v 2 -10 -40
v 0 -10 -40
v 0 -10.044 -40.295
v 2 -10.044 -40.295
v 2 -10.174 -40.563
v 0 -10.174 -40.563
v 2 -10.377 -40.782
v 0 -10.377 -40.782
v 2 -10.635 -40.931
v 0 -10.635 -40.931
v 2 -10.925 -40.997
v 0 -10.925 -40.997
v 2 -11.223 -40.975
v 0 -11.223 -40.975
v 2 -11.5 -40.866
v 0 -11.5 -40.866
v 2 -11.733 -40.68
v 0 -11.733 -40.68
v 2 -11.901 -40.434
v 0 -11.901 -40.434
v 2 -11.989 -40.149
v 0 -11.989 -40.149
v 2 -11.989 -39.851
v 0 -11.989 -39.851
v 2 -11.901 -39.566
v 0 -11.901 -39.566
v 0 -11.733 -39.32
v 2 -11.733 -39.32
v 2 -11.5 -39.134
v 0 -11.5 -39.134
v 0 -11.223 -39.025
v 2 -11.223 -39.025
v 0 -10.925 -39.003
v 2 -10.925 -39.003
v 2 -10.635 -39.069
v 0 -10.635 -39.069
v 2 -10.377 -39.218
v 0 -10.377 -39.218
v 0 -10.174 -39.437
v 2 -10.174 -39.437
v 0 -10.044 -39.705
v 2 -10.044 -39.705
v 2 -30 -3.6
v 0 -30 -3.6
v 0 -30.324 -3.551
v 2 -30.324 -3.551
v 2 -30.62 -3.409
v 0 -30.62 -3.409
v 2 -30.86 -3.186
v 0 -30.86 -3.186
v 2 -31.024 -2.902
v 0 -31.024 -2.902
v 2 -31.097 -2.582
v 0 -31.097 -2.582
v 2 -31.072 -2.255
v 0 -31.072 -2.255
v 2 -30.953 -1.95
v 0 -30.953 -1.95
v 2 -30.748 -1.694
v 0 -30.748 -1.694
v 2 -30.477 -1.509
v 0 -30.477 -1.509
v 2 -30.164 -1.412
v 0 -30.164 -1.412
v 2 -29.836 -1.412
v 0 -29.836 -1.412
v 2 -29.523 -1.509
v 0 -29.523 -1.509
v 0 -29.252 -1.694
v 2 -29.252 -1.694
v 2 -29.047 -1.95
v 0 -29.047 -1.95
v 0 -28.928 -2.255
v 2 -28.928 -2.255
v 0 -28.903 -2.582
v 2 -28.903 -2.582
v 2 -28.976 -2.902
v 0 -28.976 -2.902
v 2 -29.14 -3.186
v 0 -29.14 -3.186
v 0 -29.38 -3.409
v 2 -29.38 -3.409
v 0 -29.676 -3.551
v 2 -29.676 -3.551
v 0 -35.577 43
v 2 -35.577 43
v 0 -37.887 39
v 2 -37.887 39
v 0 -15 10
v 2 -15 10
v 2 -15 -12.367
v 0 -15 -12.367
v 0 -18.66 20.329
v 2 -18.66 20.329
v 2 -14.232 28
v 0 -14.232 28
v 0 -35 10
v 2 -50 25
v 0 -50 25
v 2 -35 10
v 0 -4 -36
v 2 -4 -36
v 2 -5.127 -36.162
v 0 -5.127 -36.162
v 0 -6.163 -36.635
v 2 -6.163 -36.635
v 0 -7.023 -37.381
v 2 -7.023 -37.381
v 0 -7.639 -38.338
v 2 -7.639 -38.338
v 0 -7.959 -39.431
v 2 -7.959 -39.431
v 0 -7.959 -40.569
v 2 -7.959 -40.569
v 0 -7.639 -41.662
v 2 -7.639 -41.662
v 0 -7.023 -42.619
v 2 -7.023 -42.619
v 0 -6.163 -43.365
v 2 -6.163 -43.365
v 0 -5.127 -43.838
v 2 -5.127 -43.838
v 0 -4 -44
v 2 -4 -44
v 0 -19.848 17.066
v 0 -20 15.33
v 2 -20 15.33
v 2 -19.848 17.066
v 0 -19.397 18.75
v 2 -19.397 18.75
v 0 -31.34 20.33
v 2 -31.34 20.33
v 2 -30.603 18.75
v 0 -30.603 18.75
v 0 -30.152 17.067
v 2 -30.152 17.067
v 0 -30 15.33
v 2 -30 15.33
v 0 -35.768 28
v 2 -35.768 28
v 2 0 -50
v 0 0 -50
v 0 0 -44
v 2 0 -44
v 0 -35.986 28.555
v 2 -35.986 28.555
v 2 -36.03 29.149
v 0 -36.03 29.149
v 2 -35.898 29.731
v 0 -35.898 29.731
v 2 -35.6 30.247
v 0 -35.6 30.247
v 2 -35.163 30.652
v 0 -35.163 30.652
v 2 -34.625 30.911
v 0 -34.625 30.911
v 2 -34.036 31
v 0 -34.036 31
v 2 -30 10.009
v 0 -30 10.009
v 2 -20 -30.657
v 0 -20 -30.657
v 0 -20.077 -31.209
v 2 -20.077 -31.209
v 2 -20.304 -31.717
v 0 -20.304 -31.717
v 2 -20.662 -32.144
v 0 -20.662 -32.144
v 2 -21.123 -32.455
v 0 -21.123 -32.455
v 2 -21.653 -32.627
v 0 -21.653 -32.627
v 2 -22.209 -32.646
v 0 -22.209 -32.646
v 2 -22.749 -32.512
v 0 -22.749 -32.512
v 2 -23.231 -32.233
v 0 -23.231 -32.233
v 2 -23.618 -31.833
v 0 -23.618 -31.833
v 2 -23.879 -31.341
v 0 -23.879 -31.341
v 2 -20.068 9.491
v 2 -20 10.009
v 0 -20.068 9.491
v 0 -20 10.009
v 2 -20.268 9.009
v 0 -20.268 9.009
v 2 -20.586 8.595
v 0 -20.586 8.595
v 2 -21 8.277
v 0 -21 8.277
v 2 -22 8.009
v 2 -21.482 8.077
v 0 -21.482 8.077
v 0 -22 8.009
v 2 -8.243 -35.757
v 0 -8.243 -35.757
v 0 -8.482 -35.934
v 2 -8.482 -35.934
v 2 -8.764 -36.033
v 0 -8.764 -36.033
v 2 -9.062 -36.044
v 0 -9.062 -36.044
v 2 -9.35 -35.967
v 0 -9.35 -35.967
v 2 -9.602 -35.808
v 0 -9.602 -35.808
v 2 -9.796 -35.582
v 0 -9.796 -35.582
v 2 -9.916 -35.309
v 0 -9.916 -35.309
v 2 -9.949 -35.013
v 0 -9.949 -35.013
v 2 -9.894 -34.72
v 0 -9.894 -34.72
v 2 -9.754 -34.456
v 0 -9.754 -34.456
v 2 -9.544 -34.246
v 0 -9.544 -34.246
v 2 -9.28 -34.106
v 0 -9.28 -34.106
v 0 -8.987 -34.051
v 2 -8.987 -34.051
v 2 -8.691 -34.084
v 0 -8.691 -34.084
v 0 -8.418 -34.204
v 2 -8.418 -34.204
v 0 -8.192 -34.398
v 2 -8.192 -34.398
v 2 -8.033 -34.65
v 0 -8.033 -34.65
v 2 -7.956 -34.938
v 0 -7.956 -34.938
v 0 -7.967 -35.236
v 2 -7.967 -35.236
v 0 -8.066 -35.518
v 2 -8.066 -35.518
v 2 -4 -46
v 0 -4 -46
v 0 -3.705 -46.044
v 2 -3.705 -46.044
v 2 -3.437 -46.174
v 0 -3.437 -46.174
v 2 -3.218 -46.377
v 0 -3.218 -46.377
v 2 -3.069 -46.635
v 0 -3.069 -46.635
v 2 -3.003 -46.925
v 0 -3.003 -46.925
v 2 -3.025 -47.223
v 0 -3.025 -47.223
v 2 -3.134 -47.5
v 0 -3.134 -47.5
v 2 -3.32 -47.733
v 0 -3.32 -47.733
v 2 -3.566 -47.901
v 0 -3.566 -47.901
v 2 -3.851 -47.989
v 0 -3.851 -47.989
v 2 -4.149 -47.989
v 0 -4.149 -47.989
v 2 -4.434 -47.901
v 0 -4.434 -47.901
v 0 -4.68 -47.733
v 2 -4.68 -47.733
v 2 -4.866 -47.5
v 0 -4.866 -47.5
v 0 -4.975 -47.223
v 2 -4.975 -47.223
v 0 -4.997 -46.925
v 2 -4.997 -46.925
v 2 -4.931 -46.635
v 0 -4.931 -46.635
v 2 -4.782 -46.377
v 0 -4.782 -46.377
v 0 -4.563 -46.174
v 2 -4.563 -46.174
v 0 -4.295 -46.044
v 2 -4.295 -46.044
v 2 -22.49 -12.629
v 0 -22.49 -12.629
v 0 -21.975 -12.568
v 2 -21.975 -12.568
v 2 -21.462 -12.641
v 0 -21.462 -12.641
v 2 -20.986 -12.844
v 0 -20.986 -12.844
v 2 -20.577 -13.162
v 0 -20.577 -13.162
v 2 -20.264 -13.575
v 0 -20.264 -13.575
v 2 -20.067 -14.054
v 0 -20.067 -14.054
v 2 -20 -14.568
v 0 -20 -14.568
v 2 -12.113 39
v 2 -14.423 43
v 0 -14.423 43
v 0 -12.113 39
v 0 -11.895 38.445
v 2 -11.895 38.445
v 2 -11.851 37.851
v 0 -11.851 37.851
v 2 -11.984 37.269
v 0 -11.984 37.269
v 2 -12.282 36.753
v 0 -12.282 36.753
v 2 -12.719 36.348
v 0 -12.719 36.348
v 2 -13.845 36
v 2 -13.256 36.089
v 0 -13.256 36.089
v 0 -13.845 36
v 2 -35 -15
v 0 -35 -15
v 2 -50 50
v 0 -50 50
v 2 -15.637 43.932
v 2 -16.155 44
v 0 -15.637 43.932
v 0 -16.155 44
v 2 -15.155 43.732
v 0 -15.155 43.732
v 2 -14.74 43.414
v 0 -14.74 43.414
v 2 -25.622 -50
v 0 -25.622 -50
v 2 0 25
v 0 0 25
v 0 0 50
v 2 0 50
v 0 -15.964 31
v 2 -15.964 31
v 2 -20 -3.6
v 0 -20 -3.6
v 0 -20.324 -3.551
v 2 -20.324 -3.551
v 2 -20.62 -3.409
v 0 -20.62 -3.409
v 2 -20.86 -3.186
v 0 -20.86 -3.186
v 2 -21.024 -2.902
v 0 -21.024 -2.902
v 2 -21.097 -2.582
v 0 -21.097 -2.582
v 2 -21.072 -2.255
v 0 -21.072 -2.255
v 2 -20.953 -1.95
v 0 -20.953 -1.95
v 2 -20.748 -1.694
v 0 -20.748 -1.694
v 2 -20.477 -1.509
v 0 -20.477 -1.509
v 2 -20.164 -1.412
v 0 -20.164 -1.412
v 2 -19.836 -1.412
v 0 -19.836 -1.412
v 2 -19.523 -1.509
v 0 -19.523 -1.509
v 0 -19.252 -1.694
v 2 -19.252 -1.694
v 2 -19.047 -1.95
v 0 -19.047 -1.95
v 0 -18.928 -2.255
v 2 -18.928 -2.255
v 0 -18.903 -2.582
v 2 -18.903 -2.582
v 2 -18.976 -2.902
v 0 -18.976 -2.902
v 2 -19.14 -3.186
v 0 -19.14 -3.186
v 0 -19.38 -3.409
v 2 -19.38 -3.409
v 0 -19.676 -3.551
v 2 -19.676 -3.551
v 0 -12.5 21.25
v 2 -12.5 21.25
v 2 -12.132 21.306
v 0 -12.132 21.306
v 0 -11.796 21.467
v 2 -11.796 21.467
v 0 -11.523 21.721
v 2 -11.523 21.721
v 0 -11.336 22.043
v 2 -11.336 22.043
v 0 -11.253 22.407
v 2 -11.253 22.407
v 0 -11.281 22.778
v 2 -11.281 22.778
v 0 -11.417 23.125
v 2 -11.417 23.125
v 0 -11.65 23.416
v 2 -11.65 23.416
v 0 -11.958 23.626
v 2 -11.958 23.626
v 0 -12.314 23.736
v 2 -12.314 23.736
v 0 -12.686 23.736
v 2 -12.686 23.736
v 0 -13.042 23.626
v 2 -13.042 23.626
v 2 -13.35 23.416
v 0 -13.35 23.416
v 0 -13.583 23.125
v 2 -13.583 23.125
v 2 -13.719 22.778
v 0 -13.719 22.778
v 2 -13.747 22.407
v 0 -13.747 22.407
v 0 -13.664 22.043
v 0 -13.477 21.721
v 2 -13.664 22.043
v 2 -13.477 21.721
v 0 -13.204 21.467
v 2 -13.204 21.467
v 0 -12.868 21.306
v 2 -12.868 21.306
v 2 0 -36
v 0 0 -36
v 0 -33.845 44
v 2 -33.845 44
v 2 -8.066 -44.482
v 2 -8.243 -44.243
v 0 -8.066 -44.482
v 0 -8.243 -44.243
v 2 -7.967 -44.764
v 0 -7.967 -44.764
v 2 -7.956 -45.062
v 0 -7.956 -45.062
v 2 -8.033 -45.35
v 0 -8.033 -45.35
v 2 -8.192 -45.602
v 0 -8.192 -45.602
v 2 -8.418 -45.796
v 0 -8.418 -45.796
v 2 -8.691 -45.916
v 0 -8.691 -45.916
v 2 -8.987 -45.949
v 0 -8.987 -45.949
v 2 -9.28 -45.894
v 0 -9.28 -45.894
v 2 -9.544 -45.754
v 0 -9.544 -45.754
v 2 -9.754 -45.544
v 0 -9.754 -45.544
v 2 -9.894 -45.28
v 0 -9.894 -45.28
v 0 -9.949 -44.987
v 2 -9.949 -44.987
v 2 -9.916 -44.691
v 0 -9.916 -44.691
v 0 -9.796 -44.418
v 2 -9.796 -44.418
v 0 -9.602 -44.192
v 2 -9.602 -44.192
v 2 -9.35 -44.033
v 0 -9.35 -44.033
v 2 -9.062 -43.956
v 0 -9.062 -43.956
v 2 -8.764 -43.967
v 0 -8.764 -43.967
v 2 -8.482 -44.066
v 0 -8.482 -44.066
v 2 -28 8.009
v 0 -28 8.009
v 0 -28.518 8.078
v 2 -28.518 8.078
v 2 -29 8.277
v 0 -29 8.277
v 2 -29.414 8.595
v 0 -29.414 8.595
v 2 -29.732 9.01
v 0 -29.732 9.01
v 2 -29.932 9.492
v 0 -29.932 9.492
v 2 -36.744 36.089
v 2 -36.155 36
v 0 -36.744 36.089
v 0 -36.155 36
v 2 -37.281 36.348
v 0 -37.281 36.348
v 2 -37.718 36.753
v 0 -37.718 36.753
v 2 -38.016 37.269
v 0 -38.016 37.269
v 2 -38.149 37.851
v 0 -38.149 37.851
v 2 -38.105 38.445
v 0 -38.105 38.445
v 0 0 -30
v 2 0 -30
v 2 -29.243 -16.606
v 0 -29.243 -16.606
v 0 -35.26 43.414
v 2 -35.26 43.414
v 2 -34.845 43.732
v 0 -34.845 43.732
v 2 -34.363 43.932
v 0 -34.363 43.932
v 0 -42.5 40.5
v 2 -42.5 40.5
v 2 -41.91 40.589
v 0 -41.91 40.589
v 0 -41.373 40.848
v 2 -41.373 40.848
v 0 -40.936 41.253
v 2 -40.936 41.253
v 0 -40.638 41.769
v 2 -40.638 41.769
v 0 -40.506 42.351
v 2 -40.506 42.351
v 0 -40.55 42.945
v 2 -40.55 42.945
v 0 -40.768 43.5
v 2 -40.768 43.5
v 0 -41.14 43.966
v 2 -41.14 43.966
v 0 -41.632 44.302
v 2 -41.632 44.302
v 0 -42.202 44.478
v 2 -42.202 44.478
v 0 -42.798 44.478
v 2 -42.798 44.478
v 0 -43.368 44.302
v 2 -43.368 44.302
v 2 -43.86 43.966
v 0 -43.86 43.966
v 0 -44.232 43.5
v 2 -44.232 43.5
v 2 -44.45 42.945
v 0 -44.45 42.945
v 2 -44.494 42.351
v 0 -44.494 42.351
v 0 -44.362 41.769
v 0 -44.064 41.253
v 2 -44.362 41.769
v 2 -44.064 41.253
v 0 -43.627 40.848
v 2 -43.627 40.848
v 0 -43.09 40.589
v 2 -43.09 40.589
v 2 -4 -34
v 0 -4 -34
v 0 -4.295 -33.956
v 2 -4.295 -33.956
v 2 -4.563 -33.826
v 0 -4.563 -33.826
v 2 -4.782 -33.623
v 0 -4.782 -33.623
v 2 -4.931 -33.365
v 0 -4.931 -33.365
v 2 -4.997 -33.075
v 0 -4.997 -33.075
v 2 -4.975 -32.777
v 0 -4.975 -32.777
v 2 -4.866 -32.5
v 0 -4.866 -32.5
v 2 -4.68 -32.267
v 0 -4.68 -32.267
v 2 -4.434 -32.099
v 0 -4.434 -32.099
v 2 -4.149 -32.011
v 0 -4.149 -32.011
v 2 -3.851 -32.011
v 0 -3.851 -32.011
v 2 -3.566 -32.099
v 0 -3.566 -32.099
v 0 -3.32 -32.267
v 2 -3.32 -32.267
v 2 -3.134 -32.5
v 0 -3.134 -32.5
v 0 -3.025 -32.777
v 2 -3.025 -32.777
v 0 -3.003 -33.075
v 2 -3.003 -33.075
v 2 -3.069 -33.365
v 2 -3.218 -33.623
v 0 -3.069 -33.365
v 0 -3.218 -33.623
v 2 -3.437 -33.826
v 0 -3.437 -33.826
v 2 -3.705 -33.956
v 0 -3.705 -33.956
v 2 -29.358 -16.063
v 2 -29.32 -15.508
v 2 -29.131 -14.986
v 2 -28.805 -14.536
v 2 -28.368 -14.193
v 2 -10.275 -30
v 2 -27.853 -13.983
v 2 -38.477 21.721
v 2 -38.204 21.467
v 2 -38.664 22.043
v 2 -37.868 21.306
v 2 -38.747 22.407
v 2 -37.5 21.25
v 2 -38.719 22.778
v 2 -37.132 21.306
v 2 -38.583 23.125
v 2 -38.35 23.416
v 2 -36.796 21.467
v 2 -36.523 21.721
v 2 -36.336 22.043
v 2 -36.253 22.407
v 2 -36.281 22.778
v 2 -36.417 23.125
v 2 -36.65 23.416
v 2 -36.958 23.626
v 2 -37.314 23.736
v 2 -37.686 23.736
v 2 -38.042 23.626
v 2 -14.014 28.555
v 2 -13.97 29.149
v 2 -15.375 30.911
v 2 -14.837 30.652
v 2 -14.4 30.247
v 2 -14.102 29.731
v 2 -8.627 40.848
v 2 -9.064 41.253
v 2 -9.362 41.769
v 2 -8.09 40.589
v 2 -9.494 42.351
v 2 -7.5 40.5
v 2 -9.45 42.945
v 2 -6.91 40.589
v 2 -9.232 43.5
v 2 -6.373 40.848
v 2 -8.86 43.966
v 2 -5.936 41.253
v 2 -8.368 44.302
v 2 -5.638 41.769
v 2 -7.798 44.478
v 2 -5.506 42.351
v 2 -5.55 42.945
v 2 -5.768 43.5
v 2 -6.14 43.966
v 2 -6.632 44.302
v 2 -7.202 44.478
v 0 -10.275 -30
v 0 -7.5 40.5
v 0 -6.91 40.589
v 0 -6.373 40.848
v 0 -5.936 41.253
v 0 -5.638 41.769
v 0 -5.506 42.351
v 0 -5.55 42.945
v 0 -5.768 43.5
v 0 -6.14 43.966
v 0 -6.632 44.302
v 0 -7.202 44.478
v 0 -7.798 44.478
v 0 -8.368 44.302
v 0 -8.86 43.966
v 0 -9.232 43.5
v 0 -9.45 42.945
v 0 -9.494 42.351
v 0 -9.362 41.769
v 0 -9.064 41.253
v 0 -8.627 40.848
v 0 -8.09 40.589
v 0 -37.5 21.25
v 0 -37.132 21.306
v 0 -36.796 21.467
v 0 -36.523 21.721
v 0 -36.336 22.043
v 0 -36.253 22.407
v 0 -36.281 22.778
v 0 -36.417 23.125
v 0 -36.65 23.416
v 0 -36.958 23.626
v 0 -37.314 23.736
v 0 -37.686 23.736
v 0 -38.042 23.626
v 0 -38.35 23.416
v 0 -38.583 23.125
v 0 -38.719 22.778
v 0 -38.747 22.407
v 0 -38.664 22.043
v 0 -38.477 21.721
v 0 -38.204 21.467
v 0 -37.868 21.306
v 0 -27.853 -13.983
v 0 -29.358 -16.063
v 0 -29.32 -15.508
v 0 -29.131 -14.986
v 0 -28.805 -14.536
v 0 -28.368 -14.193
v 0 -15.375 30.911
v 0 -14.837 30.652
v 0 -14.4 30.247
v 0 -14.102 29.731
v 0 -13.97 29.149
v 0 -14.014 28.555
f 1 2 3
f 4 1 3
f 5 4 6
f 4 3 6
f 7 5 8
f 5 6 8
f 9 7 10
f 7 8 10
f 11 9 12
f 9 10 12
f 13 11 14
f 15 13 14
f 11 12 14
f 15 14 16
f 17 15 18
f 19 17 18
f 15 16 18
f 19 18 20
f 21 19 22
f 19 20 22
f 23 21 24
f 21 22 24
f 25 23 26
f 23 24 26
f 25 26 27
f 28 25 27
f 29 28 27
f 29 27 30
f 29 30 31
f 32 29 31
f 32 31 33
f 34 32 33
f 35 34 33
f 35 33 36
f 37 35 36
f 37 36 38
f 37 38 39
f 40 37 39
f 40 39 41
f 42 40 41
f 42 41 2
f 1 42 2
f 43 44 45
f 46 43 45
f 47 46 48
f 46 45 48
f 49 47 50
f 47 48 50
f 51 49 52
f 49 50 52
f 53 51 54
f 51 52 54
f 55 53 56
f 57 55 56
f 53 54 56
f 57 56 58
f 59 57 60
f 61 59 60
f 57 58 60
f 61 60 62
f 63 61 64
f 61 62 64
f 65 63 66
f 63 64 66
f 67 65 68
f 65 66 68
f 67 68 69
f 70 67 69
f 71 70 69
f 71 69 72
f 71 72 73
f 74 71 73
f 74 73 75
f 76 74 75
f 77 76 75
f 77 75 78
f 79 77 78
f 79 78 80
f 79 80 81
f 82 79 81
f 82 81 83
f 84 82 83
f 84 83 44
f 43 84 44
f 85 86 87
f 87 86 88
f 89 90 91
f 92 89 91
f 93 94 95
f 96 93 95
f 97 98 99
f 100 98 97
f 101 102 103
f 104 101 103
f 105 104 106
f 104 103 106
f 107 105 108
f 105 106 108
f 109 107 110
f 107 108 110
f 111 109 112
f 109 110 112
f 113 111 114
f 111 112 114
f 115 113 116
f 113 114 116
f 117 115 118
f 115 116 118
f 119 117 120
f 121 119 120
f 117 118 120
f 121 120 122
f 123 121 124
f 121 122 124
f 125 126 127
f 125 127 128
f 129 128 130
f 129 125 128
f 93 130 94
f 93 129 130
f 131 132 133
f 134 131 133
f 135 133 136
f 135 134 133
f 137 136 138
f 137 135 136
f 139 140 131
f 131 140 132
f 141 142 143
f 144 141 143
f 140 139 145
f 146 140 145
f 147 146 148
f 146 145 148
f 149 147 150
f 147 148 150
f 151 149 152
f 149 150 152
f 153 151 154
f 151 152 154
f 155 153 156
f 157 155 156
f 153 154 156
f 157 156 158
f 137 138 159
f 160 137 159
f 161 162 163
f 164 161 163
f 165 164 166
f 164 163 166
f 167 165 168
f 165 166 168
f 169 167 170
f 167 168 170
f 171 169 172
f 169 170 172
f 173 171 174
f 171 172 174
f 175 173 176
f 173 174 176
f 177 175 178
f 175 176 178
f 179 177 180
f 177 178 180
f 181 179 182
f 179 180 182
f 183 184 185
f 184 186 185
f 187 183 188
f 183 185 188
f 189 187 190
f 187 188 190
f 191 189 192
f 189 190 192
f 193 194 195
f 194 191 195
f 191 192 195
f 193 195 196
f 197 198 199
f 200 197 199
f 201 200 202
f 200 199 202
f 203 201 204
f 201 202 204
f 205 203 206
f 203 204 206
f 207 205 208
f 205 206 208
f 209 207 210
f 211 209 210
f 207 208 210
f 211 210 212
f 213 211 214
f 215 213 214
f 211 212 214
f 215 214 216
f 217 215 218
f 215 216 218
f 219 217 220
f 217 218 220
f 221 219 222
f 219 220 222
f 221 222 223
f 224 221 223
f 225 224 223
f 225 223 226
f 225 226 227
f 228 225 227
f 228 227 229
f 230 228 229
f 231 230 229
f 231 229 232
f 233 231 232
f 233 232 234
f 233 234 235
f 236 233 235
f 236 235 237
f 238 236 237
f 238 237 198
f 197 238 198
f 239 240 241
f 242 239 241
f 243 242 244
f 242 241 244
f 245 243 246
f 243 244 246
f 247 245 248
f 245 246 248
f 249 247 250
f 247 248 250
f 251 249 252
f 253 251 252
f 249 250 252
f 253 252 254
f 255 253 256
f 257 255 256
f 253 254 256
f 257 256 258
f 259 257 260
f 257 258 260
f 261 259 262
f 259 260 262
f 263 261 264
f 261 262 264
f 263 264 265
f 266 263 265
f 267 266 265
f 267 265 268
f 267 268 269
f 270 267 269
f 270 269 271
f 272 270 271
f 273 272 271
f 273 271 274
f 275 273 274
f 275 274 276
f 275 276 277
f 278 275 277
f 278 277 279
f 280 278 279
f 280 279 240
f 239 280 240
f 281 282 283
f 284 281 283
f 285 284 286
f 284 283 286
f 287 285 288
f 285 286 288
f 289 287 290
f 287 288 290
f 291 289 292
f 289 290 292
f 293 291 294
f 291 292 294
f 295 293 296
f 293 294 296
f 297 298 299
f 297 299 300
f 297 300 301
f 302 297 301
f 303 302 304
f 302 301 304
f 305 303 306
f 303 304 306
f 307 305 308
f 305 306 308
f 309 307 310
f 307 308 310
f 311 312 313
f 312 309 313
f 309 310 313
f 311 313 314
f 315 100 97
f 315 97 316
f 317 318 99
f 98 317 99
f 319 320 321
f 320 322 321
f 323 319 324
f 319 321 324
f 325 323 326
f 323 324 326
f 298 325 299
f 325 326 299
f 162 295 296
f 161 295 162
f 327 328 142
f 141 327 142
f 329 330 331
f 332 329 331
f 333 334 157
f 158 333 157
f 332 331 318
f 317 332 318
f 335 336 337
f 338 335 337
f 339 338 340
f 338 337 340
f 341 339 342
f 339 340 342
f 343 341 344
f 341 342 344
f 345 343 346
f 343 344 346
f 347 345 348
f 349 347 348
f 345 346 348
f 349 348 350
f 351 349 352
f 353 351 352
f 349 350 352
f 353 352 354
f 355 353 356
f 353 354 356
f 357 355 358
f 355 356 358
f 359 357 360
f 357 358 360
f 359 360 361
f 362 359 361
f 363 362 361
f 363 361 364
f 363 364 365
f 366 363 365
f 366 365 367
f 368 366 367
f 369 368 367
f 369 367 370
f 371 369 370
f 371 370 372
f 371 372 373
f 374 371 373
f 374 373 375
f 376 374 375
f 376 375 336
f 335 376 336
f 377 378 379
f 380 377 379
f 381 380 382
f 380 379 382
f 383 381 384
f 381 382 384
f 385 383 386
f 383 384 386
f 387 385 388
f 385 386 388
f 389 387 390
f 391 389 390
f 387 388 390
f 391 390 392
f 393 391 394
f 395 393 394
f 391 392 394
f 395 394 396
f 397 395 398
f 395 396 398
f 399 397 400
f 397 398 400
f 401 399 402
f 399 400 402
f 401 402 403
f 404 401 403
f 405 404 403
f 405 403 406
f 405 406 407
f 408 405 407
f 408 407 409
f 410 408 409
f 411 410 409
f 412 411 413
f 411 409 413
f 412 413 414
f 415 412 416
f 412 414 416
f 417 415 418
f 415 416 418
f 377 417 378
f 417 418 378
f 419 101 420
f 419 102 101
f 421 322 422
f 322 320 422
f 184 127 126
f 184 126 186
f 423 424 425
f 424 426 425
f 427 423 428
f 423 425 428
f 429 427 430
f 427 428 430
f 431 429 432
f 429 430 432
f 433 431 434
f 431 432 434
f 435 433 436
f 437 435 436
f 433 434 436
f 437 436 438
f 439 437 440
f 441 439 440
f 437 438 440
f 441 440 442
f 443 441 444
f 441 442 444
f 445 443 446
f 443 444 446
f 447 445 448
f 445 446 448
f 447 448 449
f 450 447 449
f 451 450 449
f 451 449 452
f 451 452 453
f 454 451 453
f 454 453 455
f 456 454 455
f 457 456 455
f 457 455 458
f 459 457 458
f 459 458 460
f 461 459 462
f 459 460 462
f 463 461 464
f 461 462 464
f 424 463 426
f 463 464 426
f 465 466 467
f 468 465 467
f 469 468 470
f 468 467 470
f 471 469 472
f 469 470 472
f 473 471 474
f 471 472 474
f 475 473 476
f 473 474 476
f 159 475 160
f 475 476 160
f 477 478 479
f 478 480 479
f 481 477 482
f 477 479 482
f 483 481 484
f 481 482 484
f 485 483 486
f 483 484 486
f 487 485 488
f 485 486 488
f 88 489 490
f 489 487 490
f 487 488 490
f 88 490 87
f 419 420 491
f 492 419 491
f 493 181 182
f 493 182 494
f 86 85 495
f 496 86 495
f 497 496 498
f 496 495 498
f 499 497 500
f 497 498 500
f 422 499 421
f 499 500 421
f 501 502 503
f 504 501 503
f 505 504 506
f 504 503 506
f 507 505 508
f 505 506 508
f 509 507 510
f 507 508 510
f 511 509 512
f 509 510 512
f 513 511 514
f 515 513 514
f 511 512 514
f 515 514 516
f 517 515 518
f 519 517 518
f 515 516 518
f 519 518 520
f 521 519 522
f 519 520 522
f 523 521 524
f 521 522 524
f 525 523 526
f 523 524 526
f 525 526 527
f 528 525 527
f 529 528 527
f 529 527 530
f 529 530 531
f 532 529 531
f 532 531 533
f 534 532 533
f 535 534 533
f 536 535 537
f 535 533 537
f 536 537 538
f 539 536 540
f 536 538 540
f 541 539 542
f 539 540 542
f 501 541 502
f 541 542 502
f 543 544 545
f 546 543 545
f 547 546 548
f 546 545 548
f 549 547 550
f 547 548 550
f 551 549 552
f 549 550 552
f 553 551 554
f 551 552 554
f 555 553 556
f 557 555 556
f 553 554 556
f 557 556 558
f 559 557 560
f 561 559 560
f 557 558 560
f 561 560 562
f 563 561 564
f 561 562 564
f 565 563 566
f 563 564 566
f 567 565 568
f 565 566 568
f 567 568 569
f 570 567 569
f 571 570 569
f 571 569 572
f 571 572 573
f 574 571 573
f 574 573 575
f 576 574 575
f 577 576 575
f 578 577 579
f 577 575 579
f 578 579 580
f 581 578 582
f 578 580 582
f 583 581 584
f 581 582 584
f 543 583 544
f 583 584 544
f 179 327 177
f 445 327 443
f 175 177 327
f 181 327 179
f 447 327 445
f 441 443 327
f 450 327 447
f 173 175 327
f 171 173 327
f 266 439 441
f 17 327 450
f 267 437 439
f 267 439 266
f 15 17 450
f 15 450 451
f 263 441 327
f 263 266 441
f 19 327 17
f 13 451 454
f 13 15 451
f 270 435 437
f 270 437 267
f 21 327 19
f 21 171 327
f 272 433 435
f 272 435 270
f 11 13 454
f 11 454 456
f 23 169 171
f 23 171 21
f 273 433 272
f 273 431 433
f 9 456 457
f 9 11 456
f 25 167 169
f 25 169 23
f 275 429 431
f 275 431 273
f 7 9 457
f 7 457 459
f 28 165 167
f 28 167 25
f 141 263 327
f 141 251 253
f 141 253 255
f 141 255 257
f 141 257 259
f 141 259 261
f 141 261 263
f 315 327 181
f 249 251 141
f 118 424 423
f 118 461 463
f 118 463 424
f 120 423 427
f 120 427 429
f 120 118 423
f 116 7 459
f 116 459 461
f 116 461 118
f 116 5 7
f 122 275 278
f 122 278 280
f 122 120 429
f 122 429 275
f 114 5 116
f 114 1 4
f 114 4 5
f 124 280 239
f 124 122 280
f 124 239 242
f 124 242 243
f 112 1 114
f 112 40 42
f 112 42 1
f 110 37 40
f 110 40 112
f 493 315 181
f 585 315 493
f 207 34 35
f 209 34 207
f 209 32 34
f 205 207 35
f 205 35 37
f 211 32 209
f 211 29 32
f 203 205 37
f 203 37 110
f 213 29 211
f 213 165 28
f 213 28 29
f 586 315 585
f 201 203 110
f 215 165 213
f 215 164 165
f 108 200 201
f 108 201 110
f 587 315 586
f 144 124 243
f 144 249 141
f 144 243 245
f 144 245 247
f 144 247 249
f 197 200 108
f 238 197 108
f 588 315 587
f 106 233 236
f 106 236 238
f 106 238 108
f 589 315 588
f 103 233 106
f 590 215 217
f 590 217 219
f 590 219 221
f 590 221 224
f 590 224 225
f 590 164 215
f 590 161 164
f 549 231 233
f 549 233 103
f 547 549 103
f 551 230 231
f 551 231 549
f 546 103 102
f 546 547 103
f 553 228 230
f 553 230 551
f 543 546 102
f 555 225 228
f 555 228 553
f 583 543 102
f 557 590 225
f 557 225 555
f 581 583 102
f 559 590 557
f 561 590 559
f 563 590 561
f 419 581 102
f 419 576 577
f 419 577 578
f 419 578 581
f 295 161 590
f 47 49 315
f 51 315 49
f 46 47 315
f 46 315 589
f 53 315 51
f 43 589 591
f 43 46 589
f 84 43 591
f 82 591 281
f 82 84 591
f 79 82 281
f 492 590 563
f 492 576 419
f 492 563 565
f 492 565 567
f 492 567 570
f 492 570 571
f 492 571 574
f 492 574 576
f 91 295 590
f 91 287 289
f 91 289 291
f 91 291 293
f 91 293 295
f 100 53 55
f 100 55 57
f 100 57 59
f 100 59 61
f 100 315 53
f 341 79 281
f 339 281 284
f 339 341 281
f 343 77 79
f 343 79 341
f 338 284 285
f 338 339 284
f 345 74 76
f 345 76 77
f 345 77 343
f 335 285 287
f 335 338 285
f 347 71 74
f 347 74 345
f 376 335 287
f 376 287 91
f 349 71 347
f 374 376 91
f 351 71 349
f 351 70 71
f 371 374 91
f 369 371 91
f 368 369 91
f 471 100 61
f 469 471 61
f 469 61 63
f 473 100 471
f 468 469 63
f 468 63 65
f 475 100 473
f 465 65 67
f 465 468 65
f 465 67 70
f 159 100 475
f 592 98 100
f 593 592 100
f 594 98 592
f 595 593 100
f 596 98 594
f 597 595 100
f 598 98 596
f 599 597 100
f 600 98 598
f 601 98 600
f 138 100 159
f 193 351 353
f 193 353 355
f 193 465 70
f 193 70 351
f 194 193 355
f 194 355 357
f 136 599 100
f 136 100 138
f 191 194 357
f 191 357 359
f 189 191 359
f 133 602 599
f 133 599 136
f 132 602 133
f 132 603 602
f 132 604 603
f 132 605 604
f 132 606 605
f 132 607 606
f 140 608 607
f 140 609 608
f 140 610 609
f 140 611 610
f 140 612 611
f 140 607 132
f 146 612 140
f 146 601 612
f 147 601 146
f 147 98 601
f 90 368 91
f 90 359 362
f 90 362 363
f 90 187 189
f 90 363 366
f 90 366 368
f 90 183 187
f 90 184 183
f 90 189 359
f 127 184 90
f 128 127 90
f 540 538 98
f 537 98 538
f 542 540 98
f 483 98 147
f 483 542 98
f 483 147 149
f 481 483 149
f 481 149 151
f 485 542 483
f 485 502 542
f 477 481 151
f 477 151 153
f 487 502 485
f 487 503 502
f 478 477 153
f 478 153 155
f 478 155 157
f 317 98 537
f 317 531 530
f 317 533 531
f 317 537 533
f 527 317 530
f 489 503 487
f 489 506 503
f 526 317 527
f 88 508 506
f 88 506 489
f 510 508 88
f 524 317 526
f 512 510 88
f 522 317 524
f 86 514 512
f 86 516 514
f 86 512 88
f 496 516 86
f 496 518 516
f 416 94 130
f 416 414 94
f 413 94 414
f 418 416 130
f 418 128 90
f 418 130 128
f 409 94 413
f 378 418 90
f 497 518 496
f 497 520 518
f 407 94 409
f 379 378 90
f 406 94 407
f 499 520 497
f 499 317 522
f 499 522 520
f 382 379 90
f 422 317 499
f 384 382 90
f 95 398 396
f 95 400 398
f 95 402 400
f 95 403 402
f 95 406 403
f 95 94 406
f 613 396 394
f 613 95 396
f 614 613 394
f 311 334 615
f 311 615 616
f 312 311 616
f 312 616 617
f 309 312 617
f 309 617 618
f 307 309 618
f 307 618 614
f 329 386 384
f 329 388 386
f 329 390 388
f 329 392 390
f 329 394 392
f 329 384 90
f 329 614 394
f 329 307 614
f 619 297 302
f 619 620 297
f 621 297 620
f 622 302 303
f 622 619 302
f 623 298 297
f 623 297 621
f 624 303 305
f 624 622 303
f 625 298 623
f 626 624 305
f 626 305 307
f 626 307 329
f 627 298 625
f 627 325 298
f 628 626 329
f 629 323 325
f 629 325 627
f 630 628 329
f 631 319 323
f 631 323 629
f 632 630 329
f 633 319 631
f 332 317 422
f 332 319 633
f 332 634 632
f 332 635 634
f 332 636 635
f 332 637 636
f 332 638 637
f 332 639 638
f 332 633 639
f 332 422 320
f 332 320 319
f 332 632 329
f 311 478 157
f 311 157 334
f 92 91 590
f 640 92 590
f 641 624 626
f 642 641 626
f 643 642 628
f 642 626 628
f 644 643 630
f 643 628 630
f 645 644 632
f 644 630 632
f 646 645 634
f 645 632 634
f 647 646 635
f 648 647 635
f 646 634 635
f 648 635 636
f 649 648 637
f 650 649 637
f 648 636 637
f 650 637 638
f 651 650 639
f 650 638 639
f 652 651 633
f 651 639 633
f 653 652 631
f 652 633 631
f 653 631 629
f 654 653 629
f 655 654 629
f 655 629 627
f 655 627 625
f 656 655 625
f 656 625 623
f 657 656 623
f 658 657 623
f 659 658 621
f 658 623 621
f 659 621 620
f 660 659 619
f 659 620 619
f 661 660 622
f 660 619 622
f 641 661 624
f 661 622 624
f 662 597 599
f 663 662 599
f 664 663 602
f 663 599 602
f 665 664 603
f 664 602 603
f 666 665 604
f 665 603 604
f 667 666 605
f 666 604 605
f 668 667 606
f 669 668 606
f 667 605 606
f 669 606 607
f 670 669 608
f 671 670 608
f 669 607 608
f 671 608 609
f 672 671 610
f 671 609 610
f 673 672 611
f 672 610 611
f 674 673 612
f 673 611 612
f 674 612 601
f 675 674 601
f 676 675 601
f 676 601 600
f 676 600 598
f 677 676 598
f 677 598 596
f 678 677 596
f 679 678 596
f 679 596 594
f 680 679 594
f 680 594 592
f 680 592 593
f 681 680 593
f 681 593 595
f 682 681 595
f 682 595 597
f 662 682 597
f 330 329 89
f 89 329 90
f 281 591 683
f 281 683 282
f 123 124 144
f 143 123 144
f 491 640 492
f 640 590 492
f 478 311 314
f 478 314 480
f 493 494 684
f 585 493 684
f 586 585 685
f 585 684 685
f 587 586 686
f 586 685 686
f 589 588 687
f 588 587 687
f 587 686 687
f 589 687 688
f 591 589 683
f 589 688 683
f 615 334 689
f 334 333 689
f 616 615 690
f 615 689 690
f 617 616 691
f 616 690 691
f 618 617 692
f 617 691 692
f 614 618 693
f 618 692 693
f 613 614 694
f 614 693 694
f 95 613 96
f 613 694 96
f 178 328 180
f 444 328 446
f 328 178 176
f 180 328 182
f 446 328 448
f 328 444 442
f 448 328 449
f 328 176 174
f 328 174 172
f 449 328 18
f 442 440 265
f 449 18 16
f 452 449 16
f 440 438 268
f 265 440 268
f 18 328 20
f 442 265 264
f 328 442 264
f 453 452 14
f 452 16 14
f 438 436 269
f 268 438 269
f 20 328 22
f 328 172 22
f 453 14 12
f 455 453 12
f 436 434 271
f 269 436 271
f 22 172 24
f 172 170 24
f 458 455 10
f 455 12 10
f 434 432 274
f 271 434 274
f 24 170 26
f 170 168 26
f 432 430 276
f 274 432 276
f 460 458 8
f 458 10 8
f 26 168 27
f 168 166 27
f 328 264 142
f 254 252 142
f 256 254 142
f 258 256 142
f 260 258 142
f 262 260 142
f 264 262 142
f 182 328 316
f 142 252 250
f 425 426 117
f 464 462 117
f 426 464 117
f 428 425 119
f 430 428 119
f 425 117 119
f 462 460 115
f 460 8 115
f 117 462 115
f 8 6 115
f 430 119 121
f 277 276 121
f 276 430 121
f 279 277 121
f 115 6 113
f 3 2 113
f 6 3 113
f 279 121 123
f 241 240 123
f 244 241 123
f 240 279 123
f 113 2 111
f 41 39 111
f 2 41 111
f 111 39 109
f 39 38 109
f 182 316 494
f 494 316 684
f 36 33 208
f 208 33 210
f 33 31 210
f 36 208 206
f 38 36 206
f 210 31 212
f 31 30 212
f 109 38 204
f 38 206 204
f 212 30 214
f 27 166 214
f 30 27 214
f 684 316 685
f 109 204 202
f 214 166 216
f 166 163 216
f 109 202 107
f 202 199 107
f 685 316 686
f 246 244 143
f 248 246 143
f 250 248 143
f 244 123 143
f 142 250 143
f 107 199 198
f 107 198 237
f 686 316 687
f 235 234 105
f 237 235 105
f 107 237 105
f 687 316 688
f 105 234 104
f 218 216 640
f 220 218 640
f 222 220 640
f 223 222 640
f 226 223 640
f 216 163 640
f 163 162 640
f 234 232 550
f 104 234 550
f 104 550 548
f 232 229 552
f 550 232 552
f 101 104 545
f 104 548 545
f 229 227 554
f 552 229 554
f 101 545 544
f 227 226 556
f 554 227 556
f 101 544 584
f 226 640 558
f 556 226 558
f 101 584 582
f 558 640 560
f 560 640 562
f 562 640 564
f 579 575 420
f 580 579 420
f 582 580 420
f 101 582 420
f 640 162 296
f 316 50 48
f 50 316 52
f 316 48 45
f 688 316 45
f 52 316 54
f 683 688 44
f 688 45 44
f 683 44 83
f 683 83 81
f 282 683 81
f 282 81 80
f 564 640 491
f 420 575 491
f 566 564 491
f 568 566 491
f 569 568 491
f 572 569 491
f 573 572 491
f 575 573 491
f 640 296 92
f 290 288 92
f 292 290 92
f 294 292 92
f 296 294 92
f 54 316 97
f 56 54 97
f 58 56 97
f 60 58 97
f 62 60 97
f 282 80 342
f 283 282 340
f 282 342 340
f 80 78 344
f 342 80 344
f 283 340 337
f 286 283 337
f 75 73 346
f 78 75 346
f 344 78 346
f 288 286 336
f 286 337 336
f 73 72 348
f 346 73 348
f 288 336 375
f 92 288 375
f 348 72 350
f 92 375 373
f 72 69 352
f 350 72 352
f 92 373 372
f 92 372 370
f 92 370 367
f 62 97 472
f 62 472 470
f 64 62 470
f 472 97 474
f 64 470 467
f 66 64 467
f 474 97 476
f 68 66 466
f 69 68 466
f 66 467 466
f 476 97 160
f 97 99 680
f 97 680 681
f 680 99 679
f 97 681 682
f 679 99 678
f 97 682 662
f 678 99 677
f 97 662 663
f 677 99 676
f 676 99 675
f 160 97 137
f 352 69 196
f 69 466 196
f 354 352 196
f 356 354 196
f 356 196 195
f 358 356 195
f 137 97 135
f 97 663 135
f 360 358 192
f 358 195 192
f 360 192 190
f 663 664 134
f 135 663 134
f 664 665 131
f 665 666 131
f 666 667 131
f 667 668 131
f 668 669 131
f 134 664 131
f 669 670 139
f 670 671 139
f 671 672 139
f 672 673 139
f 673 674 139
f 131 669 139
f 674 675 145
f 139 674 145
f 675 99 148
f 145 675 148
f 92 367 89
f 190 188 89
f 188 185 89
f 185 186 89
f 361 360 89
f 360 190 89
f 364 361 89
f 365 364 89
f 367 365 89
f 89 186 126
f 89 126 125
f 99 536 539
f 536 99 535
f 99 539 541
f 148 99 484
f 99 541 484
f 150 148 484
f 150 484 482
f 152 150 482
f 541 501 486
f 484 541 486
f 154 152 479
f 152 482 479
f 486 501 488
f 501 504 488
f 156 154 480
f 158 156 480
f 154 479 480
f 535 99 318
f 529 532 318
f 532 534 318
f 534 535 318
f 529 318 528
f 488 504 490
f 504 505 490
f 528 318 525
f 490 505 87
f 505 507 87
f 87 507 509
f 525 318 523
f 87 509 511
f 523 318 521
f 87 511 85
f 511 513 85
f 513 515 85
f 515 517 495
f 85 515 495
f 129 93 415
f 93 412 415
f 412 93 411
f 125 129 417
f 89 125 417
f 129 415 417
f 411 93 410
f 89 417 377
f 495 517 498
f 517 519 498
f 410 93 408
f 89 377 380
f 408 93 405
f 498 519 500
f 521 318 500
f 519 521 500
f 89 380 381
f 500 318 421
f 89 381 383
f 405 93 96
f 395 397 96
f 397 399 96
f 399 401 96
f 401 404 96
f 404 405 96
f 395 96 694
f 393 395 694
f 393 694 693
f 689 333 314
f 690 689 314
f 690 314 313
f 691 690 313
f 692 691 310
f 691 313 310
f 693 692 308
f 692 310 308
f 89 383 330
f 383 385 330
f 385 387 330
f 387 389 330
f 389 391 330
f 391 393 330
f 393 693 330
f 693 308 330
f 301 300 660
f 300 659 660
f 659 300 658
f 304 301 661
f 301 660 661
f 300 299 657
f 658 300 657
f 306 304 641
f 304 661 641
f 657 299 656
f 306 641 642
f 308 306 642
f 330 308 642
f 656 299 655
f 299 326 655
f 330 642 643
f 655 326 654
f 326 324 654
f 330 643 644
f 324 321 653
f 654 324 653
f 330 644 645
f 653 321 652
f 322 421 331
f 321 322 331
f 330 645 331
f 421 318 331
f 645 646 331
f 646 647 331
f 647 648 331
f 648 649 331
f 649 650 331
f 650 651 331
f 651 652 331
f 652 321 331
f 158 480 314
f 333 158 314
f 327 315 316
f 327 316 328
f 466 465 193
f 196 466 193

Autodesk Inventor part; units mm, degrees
ref_plane "YZ Plane" through (0, 0, 0) normal (1, 0, 0) x (0, 1, 0)
ref_plane "XZ Plane" through (0, 0, 0) normal (0, 1, 0) x (-1, 0, 0)
ref_plane "XY Plane" through (0, 0, 0) normal (0, 0, 1) x (1, 0, 0)
sketch "スケッチ1" plane through (0, 0, 0) normal (1, 0, 0) x (0, 1, 0)
  line L0 (0, 50) -> (-50, 50)
  line L1 (-50, 50) -> (-50, -50)
  line L2 (-50, -50) -> (0, -50)
  line L3 (0, -50) -> (0, 50)
  point P0 (0, 0)
  dimension "d0" = 50
  dimension "d2" = 100
  dimension "d3" = 50
  dimension "d4" = 50
extrude "押し出し1" add sketch "スケッチ1" along normal blind 2
sketch "スケッチ2" plane through (2, 0, 0) normal (1, 0, 0) x (0, 0, -1)
  line L0 (-50, 0) -> (-50, -50) projected
  line L1 (-50, -50) -> (50, -50) projected
  line L2 (50, -50) -> (50, 0) projected
  line L3 (50, 0) -> (-50, 0) projected
  line L4 (-25, -50) -> (-10, -35)
  line L5 (-10, -35) -> (15, -35)
  line L6 (15, -35) -> (50, -25.6218)
  line L7 (-50, 0) -> (-25, 0)
  line L8 (-25, 0) -> (-10, -15)
  line L9 (-10, -15) -> (12.367, -15)
  line L10 (12.367, -15) -> (30, -10.2752)
  line L11 (30, -10.2752) -> (30, 0)
  line L12 (-25, -50) -> (-50, -50)
  line L13 (-50, -50) -> (-50, 0)
  point P0 (0, 0)
  dimension "d7" = 135
  dimension "d8" = 135
  dimension "d9" = 25
  dimension "d10" = 25
  dimension "d11" = 50
  dimension "d16" = 165
  dimension "d17" = 20
  dimension "d18" = 20
  dimension "d89" = 20
  dimension "d90" = 25
extrude "押し出し2" cut sketch "スケッチ2" against normal blind 2 contours L3 L8 L9 L10 L11 L2 L6 L5 L4 L1 L0 keep common part
sketch "スケッチ3" plane through (2, 0, 0) normal (1, 0, 0) x (0, 0, -1)
  line L0 (30, -10.2752) -> (30, 0) projected
  line L1 (12.367, -15) -> (30, -10.2752) projected
  line L2 (-10, -15) -> (12.367, -15) projected
  line L3 (-25, 0) -> (-10, -15) projected
  line L4 (-25, 0) -> (-50, 0) projected
  line L5 (-50, 0) -> (-50, -50) projected
  line L6 (-50, -50) -> (-25, -50) projected
  line L7 (-10, -35) -> (-25, -50) projected
  line L8 (15, -35) -> (-10, -35) projected
  line L9 (50, -25.6218) -> (15, -35) projected
  line L10 (50, -25.6218) -> (50, 0) projected
  line L11 (50, 0) -> (30, 0) projected
  circle A0 centre (-42.5, -7.5) radius 2
  circle A1 centre (-42.5, -42.5) radius 2
  circle A2 centre (-22.5, -12.5) radius 1.25
  circle A3 centre (-22.5, -37.5) radius 1.25
  arc A4 (36, -4) -> (44, -4) centre (40, -4) ccw
  line L12 (36, -4) -> (36, 0)
  line L13 (44, -4) -> (44, 0)
  point P0 (0, 0)
  dimension "d21" = 8
  dimension "d25" = 4
  dimension "d30" = 6
  dimension "d31" = 4
  dimension "d35" = 25
  dimension "d36" = 35
  dimension "d37" = 12.5
  dimension "d38" = 7.5
  dimension "d40" = 7.5
  dimension "d41" = 7.5
  dimension "d61" = 2.5
  dimension "d68" = 20
  dimension "d69" = 20
extrude "押し出し5" cut sketch "スケッチ3" against normal blind 2 contours L0 L11 L12 A4 L13 L10 L9 L8 L7 L6 L5 L4 L3 L2 L1 keep common part
sketch "スケッチ4" plane through (2, 0, 0) normal (1, 0, 0) x (0, 0, -1)
  line L0 (50, 0) -> (30, 0) projected
  circle A0 centre (33, -4) radius 1
  arc A1 (36, -4) -> (44, -4) centre (40, -4) ccw projected
  point P0 (0, 0)
  dimension "d47" = 4
  dimension "d49" = 2
  dimension "d64" = 7
hole "穴1" at (2, -4, -33) direction (-1, 0, 0) diameter 2 end through all
pattern_circular "円形状パターン2" count 5 over 180 about axis through (2, -4, -40) along (1, 0, 0) of "穴1"
sketch "スケッチ5" plane through (2, 0, 0) normal (1, 0, 0) x (0, 0, -1)
  line L0 (-10, -15) -> (12.367, -15) projected
  circle A0 centre (-22.5, -12.5) radius 1.25 projected
  circle A1 centre (-22.5, -37.5) radius 1.25 projected
  circle A2 centre (2.5, -20) radius 1.3
  circle A3 centre (2.5, -30) radius 1.3
  point P0 (0, 0)
  dimension "d70" = 2.6
  dimension "d74" = 5
  dimension "d75" = 10
  dimension "d91" = 25
  dimension "d92" = 25
hole "穴2" at (2, -20, -2.5) at (2, -30, -2.5) direction (-1, 0, 0) diameter 2.2 end through all
sketch "スケッチ7" plane through (2, 0, 0) normal (1, 0, 0) x (0, 0, -1)
  line L0 (-10, -15) -> (12.367, -15) projected
  line L1 (-25, 0) -> (-50, 0) projected
  line L2 (-50, 0) -> (-50, -50) projected
  line L3 (15, -35) -> (-10, -35) projected
  line L4 (-18.0096, -30) -> (-8.0096, -30)
  line L5 (-8.0096, -30) -> (-8.0089, -20)
  line L6 (-18.0089, -20) -> (-31, -12.5)
  line L7 (-31, -12.5) -> (-31, -37.5)
  line L8 (-31, -37.5) -> (-18.0096, -30)
  line L9 (-18.0089, -20) -> (-8.0089, -20)
  point P0 (0, 0)
  dimension "d94" = 10
  dimension "d99" = 150
  dimension "d102" = 5
  dimension "d103" = 5
  dimension "d104" = 25
  dimension "d105" = 12.5
  dimension "d106" = 19
extrude "押し出し7" cut sketch "スケッチ7" against normal blind 2
sketch "スケッチ8" plane through (2, 0, 0) normal (1, 0, 0) x (0, 0, -1)
  line L0 (-25, 0) -> (-50, 0) projected
  line L1 (-50, 0) -> (-50, -50) projected
  line L2 (50, 0) -> (44, 0) projected
  line L3 (-44, -15) -> (-44, -35)
  line L4 (-44, -15) -> (-36, -10.3812)
  line L5 (-36, -10.3812) -> (-36, -39.6188)
  line L6 (-44, -35) -> (-36, -39.6188)
  point P0 (0, 0)
  dimension "d111" = 120
  dimension "d112" = 120
  dimension "d113" = 20
  dimension "d115" = 8
  dimension "d116" = 14
  dimension "d117" = 15
extrude "押し出し8" cut sketch "スケッチ8" against normal blind 2
fillet "フィレット1" radius 10 2 edges at (1, -20, 18.0089) (1, -30, 18.0096)
fillet "フィレット2" radius 2 8 edges at (1, -30, 8.0096) (1, -12.5, 31) (1, -20, 8.0089) (1, -10.3812, 36) (1, -35, 44) (1, -15, 44) (1, -37.5, 31) (1, -39.6188, 36)
sketch "スケッチ10" plane through (2, 0, 0) normal (1, 0, 0) x (0, 0, -1)
  line L0 (-10, -15) -> (12.367, -15) projected
  line L1 (15, -35) -> (-10, -35) projected
  line L2 (50, 0) -> (44, 0) projected
  line L3 (12, -20) -> (42, -20)
  line L4 (42, -20) -> (14.5252, -30)
  line L5 (14.5252, -30) -> (12, -20)
  point P0 (0, 0)
  dimension "d124" = 30
  dimension "d127" = 160
  dimension "d128" = 5
  dimension "d129" = 5
  dimension "d130" = 12
extrude "押し出し9" cut sketch "スケッチ10" against normal blind 2
fillet "フィレット3" radius 2 3 edges at (1, -20, -12) (1, -20, -42) (1, -30, -14.5252)
properties part number "Arm_MiniLink_1" material "アルミニウム 6061"
